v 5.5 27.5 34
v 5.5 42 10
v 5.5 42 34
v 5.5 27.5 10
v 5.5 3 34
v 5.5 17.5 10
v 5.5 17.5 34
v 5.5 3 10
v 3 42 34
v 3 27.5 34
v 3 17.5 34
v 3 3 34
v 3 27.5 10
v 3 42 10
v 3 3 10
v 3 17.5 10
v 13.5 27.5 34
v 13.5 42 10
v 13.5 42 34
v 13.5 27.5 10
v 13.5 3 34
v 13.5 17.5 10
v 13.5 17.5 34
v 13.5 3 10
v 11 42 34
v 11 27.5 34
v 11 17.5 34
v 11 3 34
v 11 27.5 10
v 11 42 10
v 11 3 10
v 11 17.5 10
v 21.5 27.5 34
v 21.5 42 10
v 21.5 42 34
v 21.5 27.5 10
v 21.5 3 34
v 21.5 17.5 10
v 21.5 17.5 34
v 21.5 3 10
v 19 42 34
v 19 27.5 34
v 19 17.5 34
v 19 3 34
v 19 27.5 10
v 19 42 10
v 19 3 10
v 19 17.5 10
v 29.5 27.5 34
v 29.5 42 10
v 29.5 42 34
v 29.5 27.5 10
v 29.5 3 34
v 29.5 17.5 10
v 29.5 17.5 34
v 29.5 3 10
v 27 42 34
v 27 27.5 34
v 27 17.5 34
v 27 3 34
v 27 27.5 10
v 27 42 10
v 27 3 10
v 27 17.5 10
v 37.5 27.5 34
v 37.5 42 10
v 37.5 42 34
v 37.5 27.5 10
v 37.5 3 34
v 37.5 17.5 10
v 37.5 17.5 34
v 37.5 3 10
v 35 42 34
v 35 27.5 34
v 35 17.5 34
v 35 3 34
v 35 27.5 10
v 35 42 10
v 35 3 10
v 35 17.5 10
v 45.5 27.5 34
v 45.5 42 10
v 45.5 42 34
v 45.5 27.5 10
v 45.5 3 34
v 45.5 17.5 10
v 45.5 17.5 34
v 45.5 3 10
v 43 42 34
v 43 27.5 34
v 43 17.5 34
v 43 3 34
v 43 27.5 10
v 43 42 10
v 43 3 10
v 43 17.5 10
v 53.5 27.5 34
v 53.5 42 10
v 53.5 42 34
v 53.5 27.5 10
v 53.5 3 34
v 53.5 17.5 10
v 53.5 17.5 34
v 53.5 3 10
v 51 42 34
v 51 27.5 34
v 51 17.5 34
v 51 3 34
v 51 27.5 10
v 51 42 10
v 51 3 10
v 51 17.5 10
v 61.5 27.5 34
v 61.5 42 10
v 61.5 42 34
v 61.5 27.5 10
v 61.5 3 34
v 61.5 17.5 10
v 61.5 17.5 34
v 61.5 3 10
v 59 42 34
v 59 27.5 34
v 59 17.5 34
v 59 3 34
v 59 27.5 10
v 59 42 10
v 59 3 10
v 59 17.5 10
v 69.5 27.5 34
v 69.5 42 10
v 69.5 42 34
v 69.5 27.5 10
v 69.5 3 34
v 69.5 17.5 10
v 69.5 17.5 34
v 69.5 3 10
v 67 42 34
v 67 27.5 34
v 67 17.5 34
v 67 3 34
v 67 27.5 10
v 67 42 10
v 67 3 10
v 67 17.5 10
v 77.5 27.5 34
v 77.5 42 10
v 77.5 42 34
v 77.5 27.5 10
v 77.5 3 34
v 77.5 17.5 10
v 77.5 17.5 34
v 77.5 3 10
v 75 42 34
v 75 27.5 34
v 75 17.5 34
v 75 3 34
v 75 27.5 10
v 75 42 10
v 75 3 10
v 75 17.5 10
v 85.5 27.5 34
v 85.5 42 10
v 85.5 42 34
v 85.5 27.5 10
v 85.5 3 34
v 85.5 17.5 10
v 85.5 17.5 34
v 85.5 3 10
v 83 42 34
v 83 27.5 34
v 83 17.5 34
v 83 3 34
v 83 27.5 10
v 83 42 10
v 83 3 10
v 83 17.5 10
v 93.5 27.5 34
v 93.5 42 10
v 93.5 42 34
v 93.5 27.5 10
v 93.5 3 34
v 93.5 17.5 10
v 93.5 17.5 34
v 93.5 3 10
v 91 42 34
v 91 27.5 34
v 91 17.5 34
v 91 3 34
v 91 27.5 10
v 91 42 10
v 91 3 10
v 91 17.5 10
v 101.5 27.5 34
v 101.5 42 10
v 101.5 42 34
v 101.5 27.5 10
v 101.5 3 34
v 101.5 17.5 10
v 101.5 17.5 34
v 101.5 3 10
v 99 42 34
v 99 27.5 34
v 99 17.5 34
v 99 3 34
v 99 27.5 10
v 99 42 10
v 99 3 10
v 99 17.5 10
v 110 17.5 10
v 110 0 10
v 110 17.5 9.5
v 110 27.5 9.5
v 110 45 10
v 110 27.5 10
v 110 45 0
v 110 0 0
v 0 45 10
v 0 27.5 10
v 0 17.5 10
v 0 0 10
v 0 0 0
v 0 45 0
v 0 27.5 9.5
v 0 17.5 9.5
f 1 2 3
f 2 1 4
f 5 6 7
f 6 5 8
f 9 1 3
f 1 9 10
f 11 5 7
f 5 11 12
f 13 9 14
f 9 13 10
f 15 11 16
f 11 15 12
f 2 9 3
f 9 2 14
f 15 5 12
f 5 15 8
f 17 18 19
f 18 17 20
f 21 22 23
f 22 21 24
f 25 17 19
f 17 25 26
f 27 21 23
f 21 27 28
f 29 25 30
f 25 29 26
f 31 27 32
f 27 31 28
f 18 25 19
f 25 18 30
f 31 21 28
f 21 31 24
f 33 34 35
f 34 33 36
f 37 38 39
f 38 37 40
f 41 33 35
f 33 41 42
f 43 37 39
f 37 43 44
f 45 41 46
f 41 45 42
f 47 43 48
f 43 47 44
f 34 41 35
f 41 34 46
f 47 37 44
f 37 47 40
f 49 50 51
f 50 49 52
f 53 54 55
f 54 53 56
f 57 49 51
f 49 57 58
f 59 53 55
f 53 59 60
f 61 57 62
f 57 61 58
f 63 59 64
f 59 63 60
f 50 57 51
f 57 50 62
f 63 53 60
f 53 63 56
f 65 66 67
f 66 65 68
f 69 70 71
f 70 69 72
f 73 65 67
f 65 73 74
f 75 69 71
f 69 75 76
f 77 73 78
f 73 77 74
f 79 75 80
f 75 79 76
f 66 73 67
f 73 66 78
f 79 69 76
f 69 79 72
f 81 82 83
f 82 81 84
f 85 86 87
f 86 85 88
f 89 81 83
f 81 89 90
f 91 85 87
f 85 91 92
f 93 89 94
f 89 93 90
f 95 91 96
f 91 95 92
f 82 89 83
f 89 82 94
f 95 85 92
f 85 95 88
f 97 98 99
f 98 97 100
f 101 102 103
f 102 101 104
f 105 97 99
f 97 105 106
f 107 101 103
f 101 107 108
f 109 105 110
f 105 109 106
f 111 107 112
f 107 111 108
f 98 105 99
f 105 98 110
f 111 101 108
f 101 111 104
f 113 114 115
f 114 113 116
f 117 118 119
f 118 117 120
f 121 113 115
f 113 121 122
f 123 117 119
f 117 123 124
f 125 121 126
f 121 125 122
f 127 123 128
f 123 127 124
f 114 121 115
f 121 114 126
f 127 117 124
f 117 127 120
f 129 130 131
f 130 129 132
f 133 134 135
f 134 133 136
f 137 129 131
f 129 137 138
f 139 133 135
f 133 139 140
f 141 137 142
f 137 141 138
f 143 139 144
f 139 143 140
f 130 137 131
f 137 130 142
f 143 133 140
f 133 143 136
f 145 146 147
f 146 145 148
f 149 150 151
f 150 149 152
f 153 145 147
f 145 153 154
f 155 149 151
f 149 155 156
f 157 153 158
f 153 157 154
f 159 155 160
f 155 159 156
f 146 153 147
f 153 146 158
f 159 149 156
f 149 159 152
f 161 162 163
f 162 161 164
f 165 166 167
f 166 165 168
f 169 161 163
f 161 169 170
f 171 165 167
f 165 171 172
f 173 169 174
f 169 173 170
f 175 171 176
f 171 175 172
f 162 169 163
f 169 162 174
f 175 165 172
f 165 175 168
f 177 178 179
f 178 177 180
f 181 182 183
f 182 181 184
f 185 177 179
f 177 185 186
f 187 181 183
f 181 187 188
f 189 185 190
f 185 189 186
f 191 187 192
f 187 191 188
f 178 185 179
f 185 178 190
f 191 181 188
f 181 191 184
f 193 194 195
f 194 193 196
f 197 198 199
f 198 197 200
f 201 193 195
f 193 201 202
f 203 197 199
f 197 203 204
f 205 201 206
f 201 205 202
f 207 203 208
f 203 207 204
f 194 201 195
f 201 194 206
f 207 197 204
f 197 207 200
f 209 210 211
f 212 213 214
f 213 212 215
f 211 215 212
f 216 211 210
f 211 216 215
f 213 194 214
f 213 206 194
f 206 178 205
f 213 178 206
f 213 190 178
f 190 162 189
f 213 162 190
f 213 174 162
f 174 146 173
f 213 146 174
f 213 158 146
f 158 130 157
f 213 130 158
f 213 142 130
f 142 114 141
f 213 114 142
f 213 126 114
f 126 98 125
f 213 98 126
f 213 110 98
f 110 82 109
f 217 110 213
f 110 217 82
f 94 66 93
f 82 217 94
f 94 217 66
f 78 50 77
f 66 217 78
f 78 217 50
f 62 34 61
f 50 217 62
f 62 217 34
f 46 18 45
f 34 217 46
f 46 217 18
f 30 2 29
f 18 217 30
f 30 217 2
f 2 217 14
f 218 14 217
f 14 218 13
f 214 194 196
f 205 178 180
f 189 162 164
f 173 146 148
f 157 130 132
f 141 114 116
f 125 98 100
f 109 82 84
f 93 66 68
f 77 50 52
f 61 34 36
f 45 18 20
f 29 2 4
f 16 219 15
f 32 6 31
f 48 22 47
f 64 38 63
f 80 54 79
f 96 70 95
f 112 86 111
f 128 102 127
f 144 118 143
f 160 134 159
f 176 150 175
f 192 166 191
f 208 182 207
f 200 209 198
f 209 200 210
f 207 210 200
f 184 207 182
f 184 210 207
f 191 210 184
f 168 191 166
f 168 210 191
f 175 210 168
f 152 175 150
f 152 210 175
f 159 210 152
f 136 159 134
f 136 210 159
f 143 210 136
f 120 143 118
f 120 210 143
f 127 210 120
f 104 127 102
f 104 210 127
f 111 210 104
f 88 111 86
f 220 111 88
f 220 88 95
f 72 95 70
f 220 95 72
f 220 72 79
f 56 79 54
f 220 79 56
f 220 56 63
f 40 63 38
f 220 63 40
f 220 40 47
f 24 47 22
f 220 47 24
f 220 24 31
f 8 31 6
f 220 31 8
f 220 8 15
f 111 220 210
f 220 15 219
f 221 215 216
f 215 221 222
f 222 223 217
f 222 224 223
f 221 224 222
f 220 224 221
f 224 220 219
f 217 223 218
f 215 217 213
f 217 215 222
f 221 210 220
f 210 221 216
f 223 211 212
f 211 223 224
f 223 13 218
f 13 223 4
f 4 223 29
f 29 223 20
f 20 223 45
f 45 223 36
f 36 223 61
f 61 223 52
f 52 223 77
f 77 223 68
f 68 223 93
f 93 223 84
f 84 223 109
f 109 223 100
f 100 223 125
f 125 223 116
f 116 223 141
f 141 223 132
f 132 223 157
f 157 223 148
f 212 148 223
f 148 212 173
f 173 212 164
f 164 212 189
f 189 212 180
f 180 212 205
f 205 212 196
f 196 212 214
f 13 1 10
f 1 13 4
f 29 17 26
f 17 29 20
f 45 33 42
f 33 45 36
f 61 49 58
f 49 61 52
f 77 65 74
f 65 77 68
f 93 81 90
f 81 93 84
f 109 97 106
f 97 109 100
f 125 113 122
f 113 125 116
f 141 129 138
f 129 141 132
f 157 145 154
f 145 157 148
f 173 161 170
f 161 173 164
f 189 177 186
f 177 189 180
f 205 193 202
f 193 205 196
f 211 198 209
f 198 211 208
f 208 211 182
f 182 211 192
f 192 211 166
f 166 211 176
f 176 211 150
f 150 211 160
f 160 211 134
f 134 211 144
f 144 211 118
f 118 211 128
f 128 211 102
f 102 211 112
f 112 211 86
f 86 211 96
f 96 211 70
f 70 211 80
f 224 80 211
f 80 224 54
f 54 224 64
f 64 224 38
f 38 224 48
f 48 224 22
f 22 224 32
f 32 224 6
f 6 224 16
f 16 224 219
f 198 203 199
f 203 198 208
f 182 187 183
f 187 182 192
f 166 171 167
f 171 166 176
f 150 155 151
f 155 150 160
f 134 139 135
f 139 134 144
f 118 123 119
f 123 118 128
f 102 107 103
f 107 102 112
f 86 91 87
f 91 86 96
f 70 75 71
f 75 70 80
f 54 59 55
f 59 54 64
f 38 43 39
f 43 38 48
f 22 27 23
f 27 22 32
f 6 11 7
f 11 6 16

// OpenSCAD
$fn = 32;

// ----------------------------------------------------------------------
// Heatsink: slotted fin block
// ----------------------------------------------------------------------

// --- parameters (mm) ---
base_l = 110;             // base length, X
base_w = 45;              // base width, Y
base_t = 10;              // base plate thickness
fin_h = 25;               // fin height above the base
fin_t = 2.5;              // fin thickness
edge = 3;                 // margin from the base ends
pitch = 8;                // fin pitch
slot_w = 10;              // central slot width, Y

n_fins = floor((base_l - 2 * edge - fin_t) / pitch) + 1;  // fin count
total_h = base_t + fin_h - 1;  // overall height

difference() {
union() {
  cube([base_l, base_w, base_t]);
  for (i = [0 : n_fins - 1])
    translate([edge + i * pitch, edge, base_t - 1])
      cube([fin_t, base_w - 2 * edge, fin_h]);
}
  translate([-1, base_w / 2 - slot_w / 2, base_t - 0.5])
    cube([base_l + 2, slot_w, fin_h + 2]);
}
